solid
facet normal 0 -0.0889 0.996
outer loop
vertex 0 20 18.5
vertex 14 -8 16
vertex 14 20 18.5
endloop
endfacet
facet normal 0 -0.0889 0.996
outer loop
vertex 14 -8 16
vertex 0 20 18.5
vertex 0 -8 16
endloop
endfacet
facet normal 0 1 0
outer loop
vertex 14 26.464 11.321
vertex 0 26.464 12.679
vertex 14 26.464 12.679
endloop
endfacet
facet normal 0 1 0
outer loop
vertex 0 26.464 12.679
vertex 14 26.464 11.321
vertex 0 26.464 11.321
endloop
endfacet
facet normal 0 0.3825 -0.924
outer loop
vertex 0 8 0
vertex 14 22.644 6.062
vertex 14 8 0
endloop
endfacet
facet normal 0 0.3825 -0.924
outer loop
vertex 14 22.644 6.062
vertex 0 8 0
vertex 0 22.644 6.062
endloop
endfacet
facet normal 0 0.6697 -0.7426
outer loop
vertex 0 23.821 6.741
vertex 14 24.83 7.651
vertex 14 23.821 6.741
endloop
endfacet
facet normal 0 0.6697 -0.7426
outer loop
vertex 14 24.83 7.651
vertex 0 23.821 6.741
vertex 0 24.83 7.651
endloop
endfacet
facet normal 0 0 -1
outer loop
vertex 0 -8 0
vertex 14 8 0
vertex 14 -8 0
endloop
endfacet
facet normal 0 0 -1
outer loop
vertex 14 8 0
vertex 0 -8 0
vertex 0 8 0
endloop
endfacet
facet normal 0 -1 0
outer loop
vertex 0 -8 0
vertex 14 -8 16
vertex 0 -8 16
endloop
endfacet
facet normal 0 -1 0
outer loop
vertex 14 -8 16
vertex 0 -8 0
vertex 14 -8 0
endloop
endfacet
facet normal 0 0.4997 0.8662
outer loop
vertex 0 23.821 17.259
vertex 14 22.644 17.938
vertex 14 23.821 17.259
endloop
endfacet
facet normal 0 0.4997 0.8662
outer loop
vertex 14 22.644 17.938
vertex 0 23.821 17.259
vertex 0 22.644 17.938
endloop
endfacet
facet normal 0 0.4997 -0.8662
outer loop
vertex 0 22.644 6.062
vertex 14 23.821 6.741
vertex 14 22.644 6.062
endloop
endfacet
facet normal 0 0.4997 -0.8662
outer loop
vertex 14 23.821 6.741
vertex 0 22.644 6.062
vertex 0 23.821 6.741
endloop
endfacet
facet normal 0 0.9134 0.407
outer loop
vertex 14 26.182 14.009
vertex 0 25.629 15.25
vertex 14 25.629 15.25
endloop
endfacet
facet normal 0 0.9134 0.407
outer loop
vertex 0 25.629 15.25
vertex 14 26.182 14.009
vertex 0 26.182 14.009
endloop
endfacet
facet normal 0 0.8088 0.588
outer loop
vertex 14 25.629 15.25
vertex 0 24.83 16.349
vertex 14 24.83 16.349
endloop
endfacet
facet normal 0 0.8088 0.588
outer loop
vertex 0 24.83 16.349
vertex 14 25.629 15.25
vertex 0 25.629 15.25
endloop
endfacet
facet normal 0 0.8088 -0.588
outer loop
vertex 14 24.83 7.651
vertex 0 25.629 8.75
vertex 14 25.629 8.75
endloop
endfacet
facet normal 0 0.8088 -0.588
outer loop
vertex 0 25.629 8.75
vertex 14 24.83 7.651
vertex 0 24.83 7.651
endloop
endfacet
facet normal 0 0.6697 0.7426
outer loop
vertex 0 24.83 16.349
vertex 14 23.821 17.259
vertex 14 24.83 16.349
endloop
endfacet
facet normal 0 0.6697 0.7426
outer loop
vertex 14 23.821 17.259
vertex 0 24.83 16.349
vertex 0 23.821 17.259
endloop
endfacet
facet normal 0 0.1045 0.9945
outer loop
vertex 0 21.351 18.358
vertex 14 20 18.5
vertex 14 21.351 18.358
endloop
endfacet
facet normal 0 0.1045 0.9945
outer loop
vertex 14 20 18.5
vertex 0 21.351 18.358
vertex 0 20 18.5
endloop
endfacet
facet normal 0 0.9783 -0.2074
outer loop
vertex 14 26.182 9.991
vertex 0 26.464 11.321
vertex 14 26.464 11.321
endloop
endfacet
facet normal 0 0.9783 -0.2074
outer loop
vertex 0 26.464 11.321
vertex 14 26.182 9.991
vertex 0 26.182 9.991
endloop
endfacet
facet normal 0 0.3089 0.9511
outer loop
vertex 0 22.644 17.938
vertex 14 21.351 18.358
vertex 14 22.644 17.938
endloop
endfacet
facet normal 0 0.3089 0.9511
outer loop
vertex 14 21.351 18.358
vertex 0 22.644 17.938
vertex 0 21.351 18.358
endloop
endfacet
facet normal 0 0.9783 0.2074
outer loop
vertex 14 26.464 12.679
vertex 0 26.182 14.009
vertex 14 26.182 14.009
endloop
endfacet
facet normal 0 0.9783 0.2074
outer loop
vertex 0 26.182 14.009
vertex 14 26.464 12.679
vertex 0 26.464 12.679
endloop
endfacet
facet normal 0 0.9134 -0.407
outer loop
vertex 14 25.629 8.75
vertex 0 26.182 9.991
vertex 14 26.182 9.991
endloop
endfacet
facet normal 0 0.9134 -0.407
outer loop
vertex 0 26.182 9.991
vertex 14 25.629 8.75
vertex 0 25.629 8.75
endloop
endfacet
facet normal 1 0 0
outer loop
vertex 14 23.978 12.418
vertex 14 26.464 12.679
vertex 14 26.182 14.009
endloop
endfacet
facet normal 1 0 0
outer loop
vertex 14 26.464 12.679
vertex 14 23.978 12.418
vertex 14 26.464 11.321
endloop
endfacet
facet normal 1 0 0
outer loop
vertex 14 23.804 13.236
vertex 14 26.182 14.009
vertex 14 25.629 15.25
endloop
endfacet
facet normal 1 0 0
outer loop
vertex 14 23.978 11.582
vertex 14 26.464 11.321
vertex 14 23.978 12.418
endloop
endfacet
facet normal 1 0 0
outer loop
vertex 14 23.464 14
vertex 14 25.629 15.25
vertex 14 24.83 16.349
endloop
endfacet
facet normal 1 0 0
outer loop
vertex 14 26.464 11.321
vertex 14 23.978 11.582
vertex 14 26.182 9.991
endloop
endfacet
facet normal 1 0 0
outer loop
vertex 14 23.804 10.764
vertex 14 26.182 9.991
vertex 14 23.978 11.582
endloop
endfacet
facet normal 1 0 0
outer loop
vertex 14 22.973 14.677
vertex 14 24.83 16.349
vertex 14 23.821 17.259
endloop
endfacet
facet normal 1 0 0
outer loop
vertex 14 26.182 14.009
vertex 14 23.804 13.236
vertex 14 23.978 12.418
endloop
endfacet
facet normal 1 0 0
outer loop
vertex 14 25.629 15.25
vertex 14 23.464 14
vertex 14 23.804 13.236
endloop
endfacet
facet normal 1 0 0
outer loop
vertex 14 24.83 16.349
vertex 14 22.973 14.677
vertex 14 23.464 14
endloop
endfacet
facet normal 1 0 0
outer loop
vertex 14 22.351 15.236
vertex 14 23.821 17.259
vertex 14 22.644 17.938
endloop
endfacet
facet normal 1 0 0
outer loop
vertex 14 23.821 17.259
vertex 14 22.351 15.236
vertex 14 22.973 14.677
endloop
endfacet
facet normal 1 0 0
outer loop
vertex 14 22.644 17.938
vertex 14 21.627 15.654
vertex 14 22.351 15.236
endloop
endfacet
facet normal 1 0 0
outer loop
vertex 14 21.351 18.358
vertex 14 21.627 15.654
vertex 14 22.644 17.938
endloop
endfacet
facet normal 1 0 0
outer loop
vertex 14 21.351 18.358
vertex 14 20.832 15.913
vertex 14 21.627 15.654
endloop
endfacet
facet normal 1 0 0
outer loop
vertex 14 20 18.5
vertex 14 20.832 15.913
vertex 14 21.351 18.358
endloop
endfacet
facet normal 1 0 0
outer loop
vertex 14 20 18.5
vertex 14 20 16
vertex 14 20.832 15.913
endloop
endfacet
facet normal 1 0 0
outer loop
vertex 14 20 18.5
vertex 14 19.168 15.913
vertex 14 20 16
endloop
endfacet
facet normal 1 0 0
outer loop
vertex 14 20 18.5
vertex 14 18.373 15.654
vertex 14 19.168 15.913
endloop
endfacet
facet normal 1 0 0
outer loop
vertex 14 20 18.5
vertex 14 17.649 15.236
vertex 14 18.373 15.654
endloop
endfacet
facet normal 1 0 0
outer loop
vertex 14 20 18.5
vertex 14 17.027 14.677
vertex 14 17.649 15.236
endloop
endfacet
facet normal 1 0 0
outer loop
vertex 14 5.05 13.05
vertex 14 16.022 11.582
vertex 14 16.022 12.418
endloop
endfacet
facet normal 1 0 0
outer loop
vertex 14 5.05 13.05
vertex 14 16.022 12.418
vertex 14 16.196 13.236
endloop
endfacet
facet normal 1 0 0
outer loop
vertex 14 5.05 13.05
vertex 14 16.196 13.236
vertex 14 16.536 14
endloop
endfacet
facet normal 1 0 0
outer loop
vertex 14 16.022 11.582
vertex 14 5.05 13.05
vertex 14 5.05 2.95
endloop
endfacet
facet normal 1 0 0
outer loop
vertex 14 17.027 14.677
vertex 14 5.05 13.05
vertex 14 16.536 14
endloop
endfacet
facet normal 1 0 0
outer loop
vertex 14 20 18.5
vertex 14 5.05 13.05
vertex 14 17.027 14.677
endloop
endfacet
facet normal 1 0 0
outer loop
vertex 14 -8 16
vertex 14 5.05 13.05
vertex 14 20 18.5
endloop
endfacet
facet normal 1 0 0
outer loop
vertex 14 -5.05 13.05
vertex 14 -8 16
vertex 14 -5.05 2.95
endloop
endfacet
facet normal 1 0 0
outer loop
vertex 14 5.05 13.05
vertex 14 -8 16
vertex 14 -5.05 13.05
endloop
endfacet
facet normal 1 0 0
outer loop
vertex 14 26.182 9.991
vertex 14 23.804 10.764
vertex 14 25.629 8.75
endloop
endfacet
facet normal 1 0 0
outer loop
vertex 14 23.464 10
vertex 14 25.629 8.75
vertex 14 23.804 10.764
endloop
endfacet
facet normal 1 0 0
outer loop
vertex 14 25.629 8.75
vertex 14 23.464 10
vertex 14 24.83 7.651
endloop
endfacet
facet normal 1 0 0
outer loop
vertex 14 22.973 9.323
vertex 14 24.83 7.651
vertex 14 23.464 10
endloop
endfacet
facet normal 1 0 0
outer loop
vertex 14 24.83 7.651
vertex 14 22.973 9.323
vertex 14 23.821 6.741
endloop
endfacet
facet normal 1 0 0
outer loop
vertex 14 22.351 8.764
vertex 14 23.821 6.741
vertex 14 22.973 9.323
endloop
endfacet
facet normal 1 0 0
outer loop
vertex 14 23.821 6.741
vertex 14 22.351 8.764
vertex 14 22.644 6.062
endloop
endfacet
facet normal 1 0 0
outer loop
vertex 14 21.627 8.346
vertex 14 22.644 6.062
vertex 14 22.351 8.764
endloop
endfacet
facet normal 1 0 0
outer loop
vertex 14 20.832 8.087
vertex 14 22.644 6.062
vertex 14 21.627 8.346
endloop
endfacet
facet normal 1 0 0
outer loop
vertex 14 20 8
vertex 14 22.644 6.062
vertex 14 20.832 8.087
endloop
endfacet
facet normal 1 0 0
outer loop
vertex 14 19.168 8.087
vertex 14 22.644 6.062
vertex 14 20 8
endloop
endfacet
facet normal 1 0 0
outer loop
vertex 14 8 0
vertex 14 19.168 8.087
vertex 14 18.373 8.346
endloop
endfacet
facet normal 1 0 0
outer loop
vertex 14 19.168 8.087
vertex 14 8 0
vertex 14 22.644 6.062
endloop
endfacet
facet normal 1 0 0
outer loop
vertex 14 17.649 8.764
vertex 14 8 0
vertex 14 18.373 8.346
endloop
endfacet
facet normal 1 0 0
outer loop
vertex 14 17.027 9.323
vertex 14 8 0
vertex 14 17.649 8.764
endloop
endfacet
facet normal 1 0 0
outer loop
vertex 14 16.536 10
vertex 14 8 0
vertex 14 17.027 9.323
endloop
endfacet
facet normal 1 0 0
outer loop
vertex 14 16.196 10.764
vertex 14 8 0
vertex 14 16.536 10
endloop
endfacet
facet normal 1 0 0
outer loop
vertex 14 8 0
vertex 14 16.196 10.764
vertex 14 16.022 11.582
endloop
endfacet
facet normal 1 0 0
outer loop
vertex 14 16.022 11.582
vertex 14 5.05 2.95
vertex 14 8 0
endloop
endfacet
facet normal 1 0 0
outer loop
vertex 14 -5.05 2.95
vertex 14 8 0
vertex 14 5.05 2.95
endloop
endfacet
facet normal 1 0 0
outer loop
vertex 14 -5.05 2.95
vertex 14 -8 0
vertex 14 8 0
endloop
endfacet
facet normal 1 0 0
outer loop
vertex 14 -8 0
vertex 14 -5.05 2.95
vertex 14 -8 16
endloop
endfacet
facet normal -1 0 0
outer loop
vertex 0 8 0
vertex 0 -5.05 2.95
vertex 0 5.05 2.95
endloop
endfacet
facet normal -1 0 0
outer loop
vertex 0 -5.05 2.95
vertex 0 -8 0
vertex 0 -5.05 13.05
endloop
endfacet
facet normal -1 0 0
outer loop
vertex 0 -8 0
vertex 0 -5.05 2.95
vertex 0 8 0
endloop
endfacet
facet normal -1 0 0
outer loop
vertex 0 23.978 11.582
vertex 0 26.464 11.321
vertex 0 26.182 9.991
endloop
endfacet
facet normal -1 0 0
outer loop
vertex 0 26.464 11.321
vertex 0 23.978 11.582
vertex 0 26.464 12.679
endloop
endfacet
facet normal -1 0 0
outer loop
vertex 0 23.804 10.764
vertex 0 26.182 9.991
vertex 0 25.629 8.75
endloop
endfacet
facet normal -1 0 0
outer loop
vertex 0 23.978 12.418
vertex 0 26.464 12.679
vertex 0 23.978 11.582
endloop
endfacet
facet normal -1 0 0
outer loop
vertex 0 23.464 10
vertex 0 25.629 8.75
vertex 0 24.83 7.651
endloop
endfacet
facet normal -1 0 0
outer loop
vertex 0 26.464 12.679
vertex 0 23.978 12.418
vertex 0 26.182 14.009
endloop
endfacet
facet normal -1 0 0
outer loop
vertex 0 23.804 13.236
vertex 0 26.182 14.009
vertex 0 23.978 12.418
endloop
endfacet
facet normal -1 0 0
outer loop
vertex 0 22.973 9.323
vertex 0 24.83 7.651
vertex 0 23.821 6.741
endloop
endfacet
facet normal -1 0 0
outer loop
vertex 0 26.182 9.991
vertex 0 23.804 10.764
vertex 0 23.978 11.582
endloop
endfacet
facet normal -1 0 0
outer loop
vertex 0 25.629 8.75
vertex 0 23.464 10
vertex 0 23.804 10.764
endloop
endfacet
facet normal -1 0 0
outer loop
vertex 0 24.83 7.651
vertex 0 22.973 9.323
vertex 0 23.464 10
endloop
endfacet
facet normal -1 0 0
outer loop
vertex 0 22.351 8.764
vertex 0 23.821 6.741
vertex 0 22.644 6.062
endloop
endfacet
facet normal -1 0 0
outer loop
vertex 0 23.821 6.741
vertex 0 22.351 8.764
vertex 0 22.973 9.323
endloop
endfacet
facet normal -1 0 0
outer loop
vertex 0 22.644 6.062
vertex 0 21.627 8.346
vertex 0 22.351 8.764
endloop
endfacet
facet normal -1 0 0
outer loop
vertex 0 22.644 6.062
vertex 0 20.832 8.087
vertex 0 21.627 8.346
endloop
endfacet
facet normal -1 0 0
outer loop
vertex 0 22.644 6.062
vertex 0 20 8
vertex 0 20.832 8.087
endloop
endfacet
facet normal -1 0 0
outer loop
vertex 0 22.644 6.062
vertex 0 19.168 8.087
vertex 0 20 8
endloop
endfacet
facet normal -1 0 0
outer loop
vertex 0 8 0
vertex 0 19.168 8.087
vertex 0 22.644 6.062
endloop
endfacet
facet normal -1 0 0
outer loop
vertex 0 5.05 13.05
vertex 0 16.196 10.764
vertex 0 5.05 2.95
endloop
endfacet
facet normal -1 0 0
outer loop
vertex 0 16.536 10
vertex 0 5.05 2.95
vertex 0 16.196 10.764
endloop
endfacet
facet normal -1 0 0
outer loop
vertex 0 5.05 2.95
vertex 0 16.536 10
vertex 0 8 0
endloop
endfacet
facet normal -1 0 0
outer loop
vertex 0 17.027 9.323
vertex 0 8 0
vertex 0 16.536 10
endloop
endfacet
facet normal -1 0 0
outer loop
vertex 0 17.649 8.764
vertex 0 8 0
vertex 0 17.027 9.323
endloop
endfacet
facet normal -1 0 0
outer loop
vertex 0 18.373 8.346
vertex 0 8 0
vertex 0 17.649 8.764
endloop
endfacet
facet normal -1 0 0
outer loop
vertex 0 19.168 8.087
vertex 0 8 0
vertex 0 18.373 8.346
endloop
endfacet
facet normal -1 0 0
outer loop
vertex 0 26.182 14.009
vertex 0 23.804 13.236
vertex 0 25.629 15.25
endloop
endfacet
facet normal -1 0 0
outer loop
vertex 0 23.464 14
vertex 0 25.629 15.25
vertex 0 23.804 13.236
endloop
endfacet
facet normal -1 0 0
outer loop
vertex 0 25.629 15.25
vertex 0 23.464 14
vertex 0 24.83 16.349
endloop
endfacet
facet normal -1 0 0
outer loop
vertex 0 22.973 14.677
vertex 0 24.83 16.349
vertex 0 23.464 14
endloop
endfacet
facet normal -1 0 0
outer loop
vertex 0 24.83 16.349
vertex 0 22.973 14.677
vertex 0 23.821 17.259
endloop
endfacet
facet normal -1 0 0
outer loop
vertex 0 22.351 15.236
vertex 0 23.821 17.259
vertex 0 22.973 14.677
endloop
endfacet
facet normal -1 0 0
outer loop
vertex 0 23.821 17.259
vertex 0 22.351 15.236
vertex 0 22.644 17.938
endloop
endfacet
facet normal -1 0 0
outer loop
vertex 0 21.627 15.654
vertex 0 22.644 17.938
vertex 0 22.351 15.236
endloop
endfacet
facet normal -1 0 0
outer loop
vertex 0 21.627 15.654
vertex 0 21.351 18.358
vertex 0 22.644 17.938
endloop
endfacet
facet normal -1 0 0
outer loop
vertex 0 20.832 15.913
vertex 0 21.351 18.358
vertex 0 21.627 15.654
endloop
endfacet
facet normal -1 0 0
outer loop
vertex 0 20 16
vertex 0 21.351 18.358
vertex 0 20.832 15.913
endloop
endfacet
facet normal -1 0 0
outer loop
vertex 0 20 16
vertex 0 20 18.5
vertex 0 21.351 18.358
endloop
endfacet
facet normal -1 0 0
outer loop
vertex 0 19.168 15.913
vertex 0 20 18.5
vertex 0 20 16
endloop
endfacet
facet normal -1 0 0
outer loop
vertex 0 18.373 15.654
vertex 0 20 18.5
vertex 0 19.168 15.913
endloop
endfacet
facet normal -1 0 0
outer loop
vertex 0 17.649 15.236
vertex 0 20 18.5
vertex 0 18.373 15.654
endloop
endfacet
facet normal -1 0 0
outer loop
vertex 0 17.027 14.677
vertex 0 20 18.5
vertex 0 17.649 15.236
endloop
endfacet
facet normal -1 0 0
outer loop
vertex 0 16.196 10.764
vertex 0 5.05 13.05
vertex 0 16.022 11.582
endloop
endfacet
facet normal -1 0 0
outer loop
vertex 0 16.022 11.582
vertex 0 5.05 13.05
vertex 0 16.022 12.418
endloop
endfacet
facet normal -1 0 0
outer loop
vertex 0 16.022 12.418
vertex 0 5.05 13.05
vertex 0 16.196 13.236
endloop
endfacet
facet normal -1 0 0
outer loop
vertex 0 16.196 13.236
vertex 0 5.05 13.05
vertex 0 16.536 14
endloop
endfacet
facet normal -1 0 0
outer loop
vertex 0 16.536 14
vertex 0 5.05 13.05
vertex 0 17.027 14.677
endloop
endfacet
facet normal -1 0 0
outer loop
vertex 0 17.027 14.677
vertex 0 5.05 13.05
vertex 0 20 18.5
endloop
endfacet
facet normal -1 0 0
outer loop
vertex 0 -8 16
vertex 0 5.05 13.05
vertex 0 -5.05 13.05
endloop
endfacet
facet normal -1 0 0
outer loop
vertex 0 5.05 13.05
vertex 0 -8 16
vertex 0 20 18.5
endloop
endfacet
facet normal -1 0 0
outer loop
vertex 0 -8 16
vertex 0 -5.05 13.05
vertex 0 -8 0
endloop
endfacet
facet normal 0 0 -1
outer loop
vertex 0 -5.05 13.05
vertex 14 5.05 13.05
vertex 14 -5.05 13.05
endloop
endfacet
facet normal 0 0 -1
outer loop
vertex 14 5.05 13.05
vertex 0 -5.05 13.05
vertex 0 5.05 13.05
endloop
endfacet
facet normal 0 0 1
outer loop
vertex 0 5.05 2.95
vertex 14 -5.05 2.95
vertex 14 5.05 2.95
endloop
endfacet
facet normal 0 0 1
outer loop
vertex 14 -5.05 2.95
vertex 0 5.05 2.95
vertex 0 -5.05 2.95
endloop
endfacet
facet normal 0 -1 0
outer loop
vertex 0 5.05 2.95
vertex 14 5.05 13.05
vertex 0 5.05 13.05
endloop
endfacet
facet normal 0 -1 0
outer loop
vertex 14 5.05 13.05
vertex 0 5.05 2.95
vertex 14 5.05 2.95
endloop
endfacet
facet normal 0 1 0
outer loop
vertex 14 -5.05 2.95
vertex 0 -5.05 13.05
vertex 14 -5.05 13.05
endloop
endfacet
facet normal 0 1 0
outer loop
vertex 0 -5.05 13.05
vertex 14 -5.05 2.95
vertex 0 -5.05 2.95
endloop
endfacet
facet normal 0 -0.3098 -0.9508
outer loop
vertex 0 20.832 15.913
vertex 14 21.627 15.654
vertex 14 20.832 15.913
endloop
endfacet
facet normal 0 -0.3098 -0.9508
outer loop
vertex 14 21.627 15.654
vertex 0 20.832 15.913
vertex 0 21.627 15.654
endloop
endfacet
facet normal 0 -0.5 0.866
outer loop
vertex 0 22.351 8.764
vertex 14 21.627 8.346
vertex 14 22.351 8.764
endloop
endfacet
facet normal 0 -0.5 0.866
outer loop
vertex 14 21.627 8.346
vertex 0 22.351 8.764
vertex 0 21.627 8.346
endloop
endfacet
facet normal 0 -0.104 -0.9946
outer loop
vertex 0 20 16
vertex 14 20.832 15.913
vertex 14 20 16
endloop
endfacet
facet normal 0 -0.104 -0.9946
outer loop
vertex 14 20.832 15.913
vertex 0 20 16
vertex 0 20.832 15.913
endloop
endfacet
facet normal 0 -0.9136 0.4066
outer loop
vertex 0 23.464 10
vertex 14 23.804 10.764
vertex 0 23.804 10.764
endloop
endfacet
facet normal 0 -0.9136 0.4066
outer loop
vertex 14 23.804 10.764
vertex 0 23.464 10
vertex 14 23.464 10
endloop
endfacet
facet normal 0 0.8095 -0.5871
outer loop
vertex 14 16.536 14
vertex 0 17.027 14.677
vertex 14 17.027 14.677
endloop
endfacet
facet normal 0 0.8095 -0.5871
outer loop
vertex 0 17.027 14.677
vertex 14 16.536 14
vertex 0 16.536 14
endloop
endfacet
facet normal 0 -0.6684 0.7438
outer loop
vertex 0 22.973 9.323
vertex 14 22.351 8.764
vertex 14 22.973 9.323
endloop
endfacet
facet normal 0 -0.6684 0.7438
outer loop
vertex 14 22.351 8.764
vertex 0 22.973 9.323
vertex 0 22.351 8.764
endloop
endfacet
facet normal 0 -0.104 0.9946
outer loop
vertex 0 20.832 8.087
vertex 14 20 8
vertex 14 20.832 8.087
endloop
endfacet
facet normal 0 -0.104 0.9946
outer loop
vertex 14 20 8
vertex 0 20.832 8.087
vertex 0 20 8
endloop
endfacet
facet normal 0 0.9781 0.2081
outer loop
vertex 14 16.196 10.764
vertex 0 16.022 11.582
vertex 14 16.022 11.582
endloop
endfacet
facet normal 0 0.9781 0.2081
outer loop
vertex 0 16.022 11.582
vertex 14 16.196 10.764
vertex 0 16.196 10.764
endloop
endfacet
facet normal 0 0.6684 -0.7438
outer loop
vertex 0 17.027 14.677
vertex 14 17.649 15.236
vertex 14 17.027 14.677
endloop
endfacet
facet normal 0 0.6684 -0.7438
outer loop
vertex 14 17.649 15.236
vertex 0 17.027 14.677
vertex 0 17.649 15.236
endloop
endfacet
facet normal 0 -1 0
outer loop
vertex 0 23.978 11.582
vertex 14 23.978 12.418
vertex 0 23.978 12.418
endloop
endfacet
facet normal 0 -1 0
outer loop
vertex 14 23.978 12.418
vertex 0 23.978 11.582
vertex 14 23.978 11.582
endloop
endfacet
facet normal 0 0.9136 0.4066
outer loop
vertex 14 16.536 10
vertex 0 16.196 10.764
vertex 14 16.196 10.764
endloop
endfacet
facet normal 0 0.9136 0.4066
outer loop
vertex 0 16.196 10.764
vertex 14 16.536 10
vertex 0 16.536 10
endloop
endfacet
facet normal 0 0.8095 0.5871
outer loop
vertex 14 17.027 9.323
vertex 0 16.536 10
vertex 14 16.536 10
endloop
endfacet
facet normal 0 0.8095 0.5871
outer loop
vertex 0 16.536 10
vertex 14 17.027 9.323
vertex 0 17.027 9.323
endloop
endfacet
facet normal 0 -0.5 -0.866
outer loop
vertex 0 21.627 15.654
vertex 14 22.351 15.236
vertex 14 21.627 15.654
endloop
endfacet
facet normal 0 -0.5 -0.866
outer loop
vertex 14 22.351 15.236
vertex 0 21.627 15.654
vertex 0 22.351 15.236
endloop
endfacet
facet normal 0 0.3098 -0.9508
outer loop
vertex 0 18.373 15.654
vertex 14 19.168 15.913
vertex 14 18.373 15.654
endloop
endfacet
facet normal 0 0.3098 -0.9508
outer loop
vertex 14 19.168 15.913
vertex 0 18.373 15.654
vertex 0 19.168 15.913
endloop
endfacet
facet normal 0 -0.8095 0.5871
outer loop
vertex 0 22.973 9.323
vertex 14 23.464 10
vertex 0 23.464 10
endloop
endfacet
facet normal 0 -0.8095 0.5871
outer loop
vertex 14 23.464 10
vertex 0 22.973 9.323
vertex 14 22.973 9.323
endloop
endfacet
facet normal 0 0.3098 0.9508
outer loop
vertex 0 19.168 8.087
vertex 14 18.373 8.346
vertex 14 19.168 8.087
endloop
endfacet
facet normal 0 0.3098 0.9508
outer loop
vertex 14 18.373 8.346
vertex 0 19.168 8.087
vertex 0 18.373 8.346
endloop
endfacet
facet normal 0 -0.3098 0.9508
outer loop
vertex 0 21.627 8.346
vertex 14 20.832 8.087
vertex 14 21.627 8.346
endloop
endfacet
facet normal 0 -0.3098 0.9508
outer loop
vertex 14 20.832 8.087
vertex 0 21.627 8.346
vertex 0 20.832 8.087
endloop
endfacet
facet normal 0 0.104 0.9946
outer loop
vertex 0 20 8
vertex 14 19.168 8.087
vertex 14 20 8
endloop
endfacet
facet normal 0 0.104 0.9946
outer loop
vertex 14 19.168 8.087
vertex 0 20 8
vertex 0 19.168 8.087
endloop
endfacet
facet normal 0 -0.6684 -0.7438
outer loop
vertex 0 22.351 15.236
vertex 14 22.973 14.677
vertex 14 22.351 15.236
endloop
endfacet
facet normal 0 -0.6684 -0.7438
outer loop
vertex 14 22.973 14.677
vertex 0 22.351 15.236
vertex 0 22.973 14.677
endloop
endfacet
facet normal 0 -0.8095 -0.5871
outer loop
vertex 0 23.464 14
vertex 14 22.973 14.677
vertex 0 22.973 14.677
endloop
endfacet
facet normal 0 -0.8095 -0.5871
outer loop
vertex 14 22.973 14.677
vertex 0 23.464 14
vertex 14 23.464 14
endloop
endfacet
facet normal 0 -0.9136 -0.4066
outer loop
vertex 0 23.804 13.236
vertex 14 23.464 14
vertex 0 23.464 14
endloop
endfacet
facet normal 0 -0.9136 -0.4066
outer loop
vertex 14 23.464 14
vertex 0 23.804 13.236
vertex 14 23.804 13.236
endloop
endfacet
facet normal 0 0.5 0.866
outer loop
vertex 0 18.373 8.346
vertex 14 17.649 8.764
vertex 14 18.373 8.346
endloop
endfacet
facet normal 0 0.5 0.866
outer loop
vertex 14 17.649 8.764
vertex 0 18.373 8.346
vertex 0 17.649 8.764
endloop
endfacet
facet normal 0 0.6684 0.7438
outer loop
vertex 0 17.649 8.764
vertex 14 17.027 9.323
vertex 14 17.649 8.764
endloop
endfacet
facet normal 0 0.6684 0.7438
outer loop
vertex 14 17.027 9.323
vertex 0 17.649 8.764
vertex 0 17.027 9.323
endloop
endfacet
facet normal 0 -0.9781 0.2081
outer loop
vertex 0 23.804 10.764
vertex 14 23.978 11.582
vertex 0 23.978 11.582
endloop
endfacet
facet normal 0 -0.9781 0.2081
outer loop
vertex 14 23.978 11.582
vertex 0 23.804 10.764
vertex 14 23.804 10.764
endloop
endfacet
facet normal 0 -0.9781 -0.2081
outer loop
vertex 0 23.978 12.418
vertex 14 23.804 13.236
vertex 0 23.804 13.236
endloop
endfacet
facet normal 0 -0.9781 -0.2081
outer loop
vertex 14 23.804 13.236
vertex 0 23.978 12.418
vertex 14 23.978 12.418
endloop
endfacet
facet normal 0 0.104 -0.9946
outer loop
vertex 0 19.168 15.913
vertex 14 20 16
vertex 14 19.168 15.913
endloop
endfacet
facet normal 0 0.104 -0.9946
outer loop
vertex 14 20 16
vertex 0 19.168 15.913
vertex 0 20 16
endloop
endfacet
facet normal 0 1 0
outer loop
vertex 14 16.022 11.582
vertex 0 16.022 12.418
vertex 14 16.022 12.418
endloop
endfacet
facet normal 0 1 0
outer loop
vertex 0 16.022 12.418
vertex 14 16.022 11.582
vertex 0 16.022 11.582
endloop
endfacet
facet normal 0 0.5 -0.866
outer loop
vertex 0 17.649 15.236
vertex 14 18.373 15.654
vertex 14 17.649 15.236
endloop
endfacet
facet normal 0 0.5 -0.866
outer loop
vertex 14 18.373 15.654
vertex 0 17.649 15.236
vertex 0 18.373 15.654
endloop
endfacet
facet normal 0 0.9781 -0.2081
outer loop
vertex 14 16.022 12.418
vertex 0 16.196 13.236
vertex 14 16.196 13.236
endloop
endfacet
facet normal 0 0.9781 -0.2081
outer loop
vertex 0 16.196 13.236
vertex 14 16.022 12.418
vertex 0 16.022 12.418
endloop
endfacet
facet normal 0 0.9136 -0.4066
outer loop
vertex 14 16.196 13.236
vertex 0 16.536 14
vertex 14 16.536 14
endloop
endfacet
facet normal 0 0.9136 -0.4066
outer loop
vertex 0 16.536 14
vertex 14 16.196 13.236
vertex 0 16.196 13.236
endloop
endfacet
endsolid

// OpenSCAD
 difference(){
hull(){
translate([0,0,0])translate([0,-16/2,0])cube([14,16,16]);      
translate([0,8+7+5,16/2+4])rotate([0,90,0])cylinder(r=13/2,h=14,$fn=30); 

}

translate([-1,0,(16-10.1)/2])translate([0,-10.1/2,0])cube([50,10.1,10.1]);  


translate([-1,8+7+5,16/2+4])rotate([0,90,0])cylinder(r=8/2,h=17,$fn=30); 


}
